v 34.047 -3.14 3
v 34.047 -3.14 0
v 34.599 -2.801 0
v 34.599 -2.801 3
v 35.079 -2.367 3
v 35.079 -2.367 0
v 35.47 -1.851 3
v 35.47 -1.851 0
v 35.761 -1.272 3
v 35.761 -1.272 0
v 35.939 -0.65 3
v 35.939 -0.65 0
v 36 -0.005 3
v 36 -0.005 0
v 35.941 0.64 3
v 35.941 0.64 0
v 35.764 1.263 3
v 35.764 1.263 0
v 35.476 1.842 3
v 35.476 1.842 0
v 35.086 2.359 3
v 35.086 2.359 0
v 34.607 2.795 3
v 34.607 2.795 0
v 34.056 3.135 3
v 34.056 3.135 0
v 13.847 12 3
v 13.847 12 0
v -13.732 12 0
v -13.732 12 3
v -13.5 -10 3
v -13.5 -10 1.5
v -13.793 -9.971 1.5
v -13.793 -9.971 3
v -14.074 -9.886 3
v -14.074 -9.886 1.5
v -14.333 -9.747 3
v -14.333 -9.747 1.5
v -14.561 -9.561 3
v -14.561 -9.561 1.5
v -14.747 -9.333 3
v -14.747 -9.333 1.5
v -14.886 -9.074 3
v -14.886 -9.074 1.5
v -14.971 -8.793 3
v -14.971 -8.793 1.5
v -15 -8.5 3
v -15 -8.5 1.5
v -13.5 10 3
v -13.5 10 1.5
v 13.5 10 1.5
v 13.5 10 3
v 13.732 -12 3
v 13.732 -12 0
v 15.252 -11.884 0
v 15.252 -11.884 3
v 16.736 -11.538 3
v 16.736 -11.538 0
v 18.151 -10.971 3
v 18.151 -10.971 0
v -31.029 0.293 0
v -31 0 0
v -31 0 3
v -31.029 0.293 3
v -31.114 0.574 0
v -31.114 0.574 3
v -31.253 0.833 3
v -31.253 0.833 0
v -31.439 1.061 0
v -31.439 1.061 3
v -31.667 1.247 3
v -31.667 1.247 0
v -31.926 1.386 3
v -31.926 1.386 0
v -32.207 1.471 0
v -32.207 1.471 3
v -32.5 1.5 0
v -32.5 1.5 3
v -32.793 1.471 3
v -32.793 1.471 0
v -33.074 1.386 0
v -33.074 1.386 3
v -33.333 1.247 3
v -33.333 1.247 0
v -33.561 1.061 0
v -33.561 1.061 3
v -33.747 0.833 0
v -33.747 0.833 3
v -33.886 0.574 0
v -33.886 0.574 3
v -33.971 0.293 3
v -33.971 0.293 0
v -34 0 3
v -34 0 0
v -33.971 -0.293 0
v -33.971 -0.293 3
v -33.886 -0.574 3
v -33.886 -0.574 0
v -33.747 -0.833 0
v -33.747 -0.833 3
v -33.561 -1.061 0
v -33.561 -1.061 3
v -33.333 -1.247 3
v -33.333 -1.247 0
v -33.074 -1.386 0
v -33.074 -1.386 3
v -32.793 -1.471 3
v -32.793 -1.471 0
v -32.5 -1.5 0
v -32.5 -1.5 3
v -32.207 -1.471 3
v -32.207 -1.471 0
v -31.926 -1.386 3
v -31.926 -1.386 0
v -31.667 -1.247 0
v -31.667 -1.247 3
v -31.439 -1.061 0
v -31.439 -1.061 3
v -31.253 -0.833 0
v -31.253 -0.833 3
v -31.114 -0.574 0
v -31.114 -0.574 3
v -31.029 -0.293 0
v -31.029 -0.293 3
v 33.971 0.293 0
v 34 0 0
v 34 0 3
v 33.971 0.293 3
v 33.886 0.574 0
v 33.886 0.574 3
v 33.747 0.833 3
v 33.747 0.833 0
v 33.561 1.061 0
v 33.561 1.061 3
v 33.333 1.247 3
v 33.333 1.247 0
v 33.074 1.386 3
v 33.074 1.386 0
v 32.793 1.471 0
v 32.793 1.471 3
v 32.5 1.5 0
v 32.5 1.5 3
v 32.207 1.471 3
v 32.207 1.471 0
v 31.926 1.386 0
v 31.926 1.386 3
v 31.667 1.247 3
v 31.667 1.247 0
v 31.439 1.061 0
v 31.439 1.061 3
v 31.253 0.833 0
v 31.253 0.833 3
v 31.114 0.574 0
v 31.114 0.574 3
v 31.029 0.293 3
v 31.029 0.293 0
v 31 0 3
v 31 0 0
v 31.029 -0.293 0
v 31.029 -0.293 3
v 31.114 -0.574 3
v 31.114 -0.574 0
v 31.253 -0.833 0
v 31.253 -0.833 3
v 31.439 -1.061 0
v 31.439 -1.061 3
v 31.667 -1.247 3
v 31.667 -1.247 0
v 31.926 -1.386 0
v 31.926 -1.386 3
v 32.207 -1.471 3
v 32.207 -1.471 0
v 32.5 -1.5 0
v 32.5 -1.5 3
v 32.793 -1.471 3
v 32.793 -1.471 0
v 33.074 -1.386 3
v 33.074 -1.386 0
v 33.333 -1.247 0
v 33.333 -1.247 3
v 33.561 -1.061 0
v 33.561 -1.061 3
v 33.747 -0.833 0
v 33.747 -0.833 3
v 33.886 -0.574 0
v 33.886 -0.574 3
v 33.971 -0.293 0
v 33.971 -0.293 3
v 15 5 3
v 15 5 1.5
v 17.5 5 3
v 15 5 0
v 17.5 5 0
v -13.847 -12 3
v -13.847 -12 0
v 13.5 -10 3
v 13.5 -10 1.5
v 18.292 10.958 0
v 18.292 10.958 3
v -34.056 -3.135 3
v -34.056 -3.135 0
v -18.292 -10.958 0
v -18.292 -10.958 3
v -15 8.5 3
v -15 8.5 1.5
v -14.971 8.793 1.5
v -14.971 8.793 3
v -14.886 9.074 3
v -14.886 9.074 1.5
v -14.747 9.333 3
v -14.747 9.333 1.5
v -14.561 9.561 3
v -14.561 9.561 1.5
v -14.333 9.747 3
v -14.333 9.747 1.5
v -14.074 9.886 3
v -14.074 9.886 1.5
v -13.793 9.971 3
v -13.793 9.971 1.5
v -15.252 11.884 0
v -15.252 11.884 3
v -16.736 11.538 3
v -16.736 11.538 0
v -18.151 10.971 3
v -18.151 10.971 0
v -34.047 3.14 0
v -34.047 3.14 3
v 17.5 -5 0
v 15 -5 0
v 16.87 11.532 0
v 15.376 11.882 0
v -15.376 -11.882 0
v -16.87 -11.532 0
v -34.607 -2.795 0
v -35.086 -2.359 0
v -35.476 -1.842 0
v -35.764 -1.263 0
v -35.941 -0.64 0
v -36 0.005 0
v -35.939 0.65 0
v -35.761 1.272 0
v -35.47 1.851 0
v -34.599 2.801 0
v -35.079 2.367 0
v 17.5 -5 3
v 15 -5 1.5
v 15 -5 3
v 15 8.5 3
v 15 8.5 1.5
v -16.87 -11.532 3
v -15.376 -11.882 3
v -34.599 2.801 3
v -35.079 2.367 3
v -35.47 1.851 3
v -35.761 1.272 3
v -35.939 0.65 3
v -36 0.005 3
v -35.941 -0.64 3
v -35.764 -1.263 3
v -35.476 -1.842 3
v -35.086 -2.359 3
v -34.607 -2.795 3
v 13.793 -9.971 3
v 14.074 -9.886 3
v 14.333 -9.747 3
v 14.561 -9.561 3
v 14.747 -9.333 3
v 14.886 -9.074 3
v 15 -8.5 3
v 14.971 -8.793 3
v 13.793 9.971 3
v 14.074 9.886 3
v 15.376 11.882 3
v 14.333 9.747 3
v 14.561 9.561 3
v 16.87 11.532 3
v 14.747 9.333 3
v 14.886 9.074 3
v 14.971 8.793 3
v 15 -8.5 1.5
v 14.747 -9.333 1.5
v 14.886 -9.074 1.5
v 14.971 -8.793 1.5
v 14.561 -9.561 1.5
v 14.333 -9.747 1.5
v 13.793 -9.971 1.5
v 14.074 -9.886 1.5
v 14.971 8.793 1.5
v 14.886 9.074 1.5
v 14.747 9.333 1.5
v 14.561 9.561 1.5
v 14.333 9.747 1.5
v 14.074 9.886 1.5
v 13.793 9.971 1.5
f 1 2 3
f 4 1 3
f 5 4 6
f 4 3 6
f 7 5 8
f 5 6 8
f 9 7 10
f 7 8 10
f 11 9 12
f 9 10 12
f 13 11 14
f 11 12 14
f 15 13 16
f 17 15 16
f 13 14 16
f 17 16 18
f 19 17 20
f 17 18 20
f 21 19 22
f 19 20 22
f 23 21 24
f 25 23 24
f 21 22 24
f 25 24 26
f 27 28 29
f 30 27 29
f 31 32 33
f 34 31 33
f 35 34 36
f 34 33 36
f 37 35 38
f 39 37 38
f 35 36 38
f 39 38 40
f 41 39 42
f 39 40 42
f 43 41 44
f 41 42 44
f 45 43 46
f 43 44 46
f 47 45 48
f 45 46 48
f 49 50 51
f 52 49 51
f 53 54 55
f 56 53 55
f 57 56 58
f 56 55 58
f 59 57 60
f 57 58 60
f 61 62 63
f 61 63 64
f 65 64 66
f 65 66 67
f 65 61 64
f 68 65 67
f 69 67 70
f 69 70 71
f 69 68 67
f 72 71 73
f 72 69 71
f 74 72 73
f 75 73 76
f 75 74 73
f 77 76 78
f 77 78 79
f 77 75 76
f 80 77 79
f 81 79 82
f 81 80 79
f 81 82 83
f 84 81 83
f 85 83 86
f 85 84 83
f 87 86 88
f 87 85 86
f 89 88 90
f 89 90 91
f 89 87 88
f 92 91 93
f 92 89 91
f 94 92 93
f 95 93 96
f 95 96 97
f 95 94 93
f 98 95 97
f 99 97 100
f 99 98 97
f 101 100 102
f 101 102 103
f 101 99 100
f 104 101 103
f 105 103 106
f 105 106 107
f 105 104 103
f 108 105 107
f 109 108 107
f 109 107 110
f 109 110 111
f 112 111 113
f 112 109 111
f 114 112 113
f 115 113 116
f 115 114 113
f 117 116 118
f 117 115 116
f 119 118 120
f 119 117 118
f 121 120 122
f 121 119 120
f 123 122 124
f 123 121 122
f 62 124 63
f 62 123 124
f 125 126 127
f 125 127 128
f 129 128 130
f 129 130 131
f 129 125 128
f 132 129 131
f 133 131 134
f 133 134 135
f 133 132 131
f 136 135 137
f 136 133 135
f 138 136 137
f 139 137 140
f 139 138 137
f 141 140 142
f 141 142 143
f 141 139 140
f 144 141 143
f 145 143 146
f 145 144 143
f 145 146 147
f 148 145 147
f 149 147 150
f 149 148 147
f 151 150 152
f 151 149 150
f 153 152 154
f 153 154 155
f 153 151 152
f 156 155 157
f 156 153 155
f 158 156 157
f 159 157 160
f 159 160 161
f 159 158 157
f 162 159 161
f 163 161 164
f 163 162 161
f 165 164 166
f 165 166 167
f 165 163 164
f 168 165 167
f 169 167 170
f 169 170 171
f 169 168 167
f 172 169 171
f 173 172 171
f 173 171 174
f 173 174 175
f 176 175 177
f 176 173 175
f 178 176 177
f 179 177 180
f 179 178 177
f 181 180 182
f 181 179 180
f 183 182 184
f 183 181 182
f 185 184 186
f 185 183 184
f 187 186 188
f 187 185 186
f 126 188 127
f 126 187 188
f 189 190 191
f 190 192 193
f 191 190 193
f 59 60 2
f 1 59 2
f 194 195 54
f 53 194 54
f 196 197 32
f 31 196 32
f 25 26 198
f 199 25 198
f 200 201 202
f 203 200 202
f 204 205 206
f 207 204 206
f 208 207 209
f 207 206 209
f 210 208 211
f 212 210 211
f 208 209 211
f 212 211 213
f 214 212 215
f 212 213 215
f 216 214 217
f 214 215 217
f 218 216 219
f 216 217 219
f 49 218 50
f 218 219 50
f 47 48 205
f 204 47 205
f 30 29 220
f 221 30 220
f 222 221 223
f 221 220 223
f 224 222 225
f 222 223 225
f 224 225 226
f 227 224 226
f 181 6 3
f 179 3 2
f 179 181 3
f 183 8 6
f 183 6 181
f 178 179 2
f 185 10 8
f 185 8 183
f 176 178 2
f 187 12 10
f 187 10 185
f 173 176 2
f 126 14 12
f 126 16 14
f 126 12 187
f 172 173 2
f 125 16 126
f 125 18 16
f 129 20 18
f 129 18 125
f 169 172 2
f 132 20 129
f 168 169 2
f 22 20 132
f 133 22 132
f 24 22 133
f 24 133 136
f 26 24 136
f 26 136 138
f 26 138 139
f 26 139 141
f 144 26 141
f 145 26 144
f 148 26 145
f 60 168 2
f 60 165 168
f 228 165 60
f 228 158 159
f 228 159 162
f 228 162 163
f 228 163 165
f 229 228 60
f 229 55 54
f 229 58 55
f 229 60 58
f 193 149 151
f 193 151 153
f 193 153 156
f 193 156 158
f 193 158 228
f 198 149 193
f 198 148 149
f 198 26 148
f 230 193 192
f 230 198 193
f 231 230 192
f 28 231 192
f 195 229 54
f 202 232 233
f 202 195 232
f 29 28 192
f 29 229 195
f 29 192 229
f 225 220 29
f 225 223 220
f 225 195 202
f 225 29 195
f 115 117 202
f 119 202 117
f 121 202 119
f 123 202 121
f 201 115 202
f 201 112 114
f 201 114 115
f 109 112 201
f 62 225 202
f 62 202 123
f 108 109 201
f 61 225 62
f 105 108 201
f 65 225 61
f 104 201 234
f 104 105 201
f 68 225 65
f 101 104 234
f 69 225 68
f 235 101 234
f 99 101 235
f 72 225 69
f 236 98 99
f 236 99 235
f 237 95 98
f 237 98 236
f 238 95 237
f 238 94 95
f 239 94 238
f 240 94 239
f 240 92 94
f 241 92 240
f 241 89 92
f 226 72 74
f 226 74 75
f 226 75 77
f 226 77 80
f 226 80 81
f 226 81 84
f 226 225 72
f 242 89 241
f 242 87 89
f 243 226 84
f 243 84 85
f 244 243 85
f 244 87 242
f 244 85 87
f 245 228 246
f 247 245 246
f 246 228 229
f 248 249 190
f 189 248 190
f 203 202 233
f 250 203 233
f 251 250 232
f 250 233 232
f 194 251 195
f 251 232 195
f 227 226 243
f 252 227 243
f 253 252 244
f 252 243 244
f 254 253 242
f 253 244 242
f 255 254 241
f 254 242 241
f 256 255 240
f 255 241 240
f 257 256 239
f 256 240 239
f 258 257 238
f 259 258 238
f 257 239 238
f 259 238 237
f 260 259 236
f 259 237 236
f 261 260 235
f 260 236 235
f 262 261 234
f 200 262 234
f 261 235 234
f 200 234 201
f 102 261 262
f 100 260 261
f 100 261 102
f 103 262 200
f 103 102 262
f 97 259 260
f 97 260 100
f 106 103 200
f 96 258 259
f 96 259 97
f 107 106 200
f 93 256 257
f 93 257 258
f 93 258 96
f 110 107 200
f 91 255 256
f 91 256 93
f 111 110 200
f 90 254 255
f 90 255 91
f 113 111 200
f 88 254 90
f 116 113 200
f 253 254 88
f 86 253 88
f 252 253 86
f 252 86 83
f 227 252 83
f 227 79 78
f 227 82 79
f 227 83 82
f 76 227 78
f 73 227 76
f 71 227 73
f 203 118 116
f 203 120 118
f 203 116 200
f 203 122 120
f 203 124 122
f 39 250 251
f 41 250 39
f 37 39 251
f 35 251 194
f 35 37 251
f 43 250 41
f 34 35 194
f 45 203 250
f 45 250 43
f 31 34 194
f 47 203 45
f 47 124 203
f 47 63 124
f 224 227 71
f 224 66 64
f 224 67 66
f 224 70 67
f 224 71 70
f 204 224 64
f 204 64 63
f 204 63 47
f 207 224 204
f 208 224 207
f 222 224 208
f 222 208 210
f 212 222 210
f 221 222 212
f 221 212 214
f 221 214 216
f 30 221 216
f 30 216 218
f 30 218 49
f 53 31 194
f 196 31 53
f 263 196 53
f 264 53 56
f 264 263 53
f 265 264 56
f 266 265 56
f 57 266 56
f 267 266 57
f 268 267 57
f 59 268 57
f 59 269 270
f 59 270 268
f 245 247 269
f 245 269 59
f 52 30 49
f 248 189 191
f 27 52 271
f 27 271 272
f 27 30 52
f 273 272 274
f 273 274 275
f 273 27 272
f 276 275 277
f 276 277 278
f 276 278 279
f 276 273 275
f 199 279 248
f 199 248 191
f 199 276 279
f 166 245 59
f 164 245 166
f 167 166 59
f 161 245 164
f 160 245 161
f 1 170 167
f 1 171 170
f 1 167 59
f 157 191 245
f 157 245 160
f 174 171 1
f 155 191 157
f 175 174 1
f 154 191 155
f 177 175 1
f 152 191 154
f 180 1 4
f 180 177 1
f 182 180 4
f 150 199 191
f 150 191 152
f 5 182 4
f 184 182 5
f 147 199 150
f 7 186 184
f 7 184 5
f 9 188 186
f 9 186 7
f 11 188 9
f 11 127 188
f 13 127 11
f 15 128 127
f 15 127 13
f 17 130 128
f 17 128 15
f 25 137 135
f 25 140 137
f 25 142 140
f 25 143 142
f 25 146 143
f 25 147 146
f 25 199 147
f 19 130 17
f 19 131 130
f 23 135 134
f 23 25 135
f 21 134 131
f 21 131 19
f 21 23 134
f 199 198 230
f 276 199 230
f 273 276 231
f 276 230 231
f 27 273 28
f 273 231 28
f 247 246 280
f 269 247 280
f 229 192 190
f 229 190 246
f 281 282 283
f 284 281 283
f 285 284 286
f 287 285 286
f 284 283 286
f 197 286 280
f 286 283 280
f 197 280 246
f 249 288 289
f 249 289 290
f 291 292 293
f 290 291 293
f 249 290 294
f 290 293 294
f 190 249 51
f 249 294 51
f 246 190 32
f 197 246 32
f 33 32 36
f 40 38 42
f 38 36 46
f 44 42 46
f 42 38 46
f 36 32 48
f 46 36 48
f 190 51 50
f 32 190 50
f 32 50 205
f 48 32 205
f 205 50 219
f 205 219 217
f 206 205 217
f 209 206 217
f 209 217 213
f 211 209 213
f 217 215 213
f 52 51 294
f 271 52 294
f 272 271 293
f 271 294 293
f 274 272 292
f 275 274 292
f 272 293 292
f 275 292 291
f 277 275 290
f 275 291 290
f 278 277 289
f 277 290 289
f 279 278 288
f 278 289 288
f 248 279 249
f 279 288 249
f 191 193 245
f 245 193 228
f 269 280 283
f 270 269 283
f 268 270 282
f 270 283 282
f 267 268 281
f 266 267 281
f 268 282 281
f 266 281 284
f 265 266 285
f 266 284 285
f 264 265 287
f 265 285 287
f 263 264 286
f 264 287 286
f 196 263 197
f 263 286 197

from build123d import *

# Parameters (mm, degrees)
SKETCH1_R           = 1.5
BOSS_EXTRUDE1_DEPTH = 3
BOSS_EXTRUDE2_DEPTH = 1.5


with BuildPart() as part:
    # Sketch1 → Boss-Extrude1 (new body)
    with BuildSketch(Plane.XY):
        with BuildLine():
            Line((-18.151142685, 10.970518354), (-34.046738684, 3.139681424))
            ThreePointArc((-34.046738684, 3.139681424), (-35.999996343, 0.005059225), (-34.055808986, -3.135196708))
            Line((-34.055808986, -3.135196708), (-18.292240263, -10.957704881))
            ThreePointArc((-18.292240263, -10.957704881), (-16.129937386, -11.735939832), (-13.847071731, -12))
            Line((-13.847071731, -12), (13.731889302, -12))
            ThreePointArc((13.731889302, -12), (16.000679339, -11.739229526), (18.151142685, -10.970518354))
            Line((18.151142685, -10.970518354), (34.046738684, -3.139681424))
            ThreePointArc((34.046738684, -3.139681424), (35.999996343, -0.005059225), (34.055808986, 3.135196708))
            Line((34.055808986, 3.135196708), (18.292240263, 10.957704881))
            ThreePointArc((18.292240263, 10.957704881), (16.129937386, 11.735939832), (13.847071731, 12))
            Line((13.847071731, 12), (-13.731889302, 12))
            ThreePointArc((-13.731889302, 12), (-16.000679339, 11.739229526), (-18.151142685, 10.970518354))
        make_face()
        with Locations((-32.5, 0)):
            Circle(SKETCH1_R, mode=Mode.SUBTRACT)
        with BuildLine():
            Line((13.5, -10), (-13.5, -10))
            ThreePointArc((-13.5, -10), (-14.560660172, -9.560660172), (-15, -8.5))
            Line((-15, -8.5), (-15, 8.5))
            ThreePointArc((-15, 8.5), (-14.560660172, 9.560660172), (-13.5, 10))
            Line((-13.5, 10), (13.5, 10))
            ThreePointArc((13.5, 10), (14.560660172, 9.560660172), (15, 8.5))
            Line((15, 8.5), (15, 5))
            Line((15, 5), (17.5, 5))
            Line((17.5, 5), (17.5, -5))
            Line((17.5, -5), (15, -5))
            Line((15, -5), (15, -8.5))
            ThreePointArc((15, -8.5), (14.560660172, -9.560660172), (13.5, -10))
        make_face(mode=Mode.SUBTRACT)
        with Locations((32.5, 0)):
            Circle(SKETCH1_R, mode=Mode.SUBTRACT)
    extrude(amount=BOSS_EXTRUDE1_DEPTH)

    # Sketch1<3> → Boss-Extrude2 (add)
    with BuildSketch(Plane.XY):
        with BuildLine():
            ThreePointArc((-15, -8.5), (-14.560660172, -9.560660172), (-13.5, -10))
            Line((-13.5, -10), (13.5, -10))
            ThreePointArc((13.5, -10), (14.560660172, -9.560660172), (15, -8.5))
            Line((15, -8.5), (15, -5))
            Line((15, -5), (15, 5))
            Line((15, 5), (15, 8.5))
            ThreePointArc((15, 8.5), (14.560660172, 9.560660172), (13.5, 10))
            Line((13.5, 10), (-13.5, 10))
            ThreePointArc((-13.5, 10), (-14.560660172, 9.560660172), (-15, 8.5))
            Line((-15, 8.5), (-15, -8.5))
        make_face()
    extrude(amount=BOSS_EXTRUDE2_DEPTH)


solid = part.part
